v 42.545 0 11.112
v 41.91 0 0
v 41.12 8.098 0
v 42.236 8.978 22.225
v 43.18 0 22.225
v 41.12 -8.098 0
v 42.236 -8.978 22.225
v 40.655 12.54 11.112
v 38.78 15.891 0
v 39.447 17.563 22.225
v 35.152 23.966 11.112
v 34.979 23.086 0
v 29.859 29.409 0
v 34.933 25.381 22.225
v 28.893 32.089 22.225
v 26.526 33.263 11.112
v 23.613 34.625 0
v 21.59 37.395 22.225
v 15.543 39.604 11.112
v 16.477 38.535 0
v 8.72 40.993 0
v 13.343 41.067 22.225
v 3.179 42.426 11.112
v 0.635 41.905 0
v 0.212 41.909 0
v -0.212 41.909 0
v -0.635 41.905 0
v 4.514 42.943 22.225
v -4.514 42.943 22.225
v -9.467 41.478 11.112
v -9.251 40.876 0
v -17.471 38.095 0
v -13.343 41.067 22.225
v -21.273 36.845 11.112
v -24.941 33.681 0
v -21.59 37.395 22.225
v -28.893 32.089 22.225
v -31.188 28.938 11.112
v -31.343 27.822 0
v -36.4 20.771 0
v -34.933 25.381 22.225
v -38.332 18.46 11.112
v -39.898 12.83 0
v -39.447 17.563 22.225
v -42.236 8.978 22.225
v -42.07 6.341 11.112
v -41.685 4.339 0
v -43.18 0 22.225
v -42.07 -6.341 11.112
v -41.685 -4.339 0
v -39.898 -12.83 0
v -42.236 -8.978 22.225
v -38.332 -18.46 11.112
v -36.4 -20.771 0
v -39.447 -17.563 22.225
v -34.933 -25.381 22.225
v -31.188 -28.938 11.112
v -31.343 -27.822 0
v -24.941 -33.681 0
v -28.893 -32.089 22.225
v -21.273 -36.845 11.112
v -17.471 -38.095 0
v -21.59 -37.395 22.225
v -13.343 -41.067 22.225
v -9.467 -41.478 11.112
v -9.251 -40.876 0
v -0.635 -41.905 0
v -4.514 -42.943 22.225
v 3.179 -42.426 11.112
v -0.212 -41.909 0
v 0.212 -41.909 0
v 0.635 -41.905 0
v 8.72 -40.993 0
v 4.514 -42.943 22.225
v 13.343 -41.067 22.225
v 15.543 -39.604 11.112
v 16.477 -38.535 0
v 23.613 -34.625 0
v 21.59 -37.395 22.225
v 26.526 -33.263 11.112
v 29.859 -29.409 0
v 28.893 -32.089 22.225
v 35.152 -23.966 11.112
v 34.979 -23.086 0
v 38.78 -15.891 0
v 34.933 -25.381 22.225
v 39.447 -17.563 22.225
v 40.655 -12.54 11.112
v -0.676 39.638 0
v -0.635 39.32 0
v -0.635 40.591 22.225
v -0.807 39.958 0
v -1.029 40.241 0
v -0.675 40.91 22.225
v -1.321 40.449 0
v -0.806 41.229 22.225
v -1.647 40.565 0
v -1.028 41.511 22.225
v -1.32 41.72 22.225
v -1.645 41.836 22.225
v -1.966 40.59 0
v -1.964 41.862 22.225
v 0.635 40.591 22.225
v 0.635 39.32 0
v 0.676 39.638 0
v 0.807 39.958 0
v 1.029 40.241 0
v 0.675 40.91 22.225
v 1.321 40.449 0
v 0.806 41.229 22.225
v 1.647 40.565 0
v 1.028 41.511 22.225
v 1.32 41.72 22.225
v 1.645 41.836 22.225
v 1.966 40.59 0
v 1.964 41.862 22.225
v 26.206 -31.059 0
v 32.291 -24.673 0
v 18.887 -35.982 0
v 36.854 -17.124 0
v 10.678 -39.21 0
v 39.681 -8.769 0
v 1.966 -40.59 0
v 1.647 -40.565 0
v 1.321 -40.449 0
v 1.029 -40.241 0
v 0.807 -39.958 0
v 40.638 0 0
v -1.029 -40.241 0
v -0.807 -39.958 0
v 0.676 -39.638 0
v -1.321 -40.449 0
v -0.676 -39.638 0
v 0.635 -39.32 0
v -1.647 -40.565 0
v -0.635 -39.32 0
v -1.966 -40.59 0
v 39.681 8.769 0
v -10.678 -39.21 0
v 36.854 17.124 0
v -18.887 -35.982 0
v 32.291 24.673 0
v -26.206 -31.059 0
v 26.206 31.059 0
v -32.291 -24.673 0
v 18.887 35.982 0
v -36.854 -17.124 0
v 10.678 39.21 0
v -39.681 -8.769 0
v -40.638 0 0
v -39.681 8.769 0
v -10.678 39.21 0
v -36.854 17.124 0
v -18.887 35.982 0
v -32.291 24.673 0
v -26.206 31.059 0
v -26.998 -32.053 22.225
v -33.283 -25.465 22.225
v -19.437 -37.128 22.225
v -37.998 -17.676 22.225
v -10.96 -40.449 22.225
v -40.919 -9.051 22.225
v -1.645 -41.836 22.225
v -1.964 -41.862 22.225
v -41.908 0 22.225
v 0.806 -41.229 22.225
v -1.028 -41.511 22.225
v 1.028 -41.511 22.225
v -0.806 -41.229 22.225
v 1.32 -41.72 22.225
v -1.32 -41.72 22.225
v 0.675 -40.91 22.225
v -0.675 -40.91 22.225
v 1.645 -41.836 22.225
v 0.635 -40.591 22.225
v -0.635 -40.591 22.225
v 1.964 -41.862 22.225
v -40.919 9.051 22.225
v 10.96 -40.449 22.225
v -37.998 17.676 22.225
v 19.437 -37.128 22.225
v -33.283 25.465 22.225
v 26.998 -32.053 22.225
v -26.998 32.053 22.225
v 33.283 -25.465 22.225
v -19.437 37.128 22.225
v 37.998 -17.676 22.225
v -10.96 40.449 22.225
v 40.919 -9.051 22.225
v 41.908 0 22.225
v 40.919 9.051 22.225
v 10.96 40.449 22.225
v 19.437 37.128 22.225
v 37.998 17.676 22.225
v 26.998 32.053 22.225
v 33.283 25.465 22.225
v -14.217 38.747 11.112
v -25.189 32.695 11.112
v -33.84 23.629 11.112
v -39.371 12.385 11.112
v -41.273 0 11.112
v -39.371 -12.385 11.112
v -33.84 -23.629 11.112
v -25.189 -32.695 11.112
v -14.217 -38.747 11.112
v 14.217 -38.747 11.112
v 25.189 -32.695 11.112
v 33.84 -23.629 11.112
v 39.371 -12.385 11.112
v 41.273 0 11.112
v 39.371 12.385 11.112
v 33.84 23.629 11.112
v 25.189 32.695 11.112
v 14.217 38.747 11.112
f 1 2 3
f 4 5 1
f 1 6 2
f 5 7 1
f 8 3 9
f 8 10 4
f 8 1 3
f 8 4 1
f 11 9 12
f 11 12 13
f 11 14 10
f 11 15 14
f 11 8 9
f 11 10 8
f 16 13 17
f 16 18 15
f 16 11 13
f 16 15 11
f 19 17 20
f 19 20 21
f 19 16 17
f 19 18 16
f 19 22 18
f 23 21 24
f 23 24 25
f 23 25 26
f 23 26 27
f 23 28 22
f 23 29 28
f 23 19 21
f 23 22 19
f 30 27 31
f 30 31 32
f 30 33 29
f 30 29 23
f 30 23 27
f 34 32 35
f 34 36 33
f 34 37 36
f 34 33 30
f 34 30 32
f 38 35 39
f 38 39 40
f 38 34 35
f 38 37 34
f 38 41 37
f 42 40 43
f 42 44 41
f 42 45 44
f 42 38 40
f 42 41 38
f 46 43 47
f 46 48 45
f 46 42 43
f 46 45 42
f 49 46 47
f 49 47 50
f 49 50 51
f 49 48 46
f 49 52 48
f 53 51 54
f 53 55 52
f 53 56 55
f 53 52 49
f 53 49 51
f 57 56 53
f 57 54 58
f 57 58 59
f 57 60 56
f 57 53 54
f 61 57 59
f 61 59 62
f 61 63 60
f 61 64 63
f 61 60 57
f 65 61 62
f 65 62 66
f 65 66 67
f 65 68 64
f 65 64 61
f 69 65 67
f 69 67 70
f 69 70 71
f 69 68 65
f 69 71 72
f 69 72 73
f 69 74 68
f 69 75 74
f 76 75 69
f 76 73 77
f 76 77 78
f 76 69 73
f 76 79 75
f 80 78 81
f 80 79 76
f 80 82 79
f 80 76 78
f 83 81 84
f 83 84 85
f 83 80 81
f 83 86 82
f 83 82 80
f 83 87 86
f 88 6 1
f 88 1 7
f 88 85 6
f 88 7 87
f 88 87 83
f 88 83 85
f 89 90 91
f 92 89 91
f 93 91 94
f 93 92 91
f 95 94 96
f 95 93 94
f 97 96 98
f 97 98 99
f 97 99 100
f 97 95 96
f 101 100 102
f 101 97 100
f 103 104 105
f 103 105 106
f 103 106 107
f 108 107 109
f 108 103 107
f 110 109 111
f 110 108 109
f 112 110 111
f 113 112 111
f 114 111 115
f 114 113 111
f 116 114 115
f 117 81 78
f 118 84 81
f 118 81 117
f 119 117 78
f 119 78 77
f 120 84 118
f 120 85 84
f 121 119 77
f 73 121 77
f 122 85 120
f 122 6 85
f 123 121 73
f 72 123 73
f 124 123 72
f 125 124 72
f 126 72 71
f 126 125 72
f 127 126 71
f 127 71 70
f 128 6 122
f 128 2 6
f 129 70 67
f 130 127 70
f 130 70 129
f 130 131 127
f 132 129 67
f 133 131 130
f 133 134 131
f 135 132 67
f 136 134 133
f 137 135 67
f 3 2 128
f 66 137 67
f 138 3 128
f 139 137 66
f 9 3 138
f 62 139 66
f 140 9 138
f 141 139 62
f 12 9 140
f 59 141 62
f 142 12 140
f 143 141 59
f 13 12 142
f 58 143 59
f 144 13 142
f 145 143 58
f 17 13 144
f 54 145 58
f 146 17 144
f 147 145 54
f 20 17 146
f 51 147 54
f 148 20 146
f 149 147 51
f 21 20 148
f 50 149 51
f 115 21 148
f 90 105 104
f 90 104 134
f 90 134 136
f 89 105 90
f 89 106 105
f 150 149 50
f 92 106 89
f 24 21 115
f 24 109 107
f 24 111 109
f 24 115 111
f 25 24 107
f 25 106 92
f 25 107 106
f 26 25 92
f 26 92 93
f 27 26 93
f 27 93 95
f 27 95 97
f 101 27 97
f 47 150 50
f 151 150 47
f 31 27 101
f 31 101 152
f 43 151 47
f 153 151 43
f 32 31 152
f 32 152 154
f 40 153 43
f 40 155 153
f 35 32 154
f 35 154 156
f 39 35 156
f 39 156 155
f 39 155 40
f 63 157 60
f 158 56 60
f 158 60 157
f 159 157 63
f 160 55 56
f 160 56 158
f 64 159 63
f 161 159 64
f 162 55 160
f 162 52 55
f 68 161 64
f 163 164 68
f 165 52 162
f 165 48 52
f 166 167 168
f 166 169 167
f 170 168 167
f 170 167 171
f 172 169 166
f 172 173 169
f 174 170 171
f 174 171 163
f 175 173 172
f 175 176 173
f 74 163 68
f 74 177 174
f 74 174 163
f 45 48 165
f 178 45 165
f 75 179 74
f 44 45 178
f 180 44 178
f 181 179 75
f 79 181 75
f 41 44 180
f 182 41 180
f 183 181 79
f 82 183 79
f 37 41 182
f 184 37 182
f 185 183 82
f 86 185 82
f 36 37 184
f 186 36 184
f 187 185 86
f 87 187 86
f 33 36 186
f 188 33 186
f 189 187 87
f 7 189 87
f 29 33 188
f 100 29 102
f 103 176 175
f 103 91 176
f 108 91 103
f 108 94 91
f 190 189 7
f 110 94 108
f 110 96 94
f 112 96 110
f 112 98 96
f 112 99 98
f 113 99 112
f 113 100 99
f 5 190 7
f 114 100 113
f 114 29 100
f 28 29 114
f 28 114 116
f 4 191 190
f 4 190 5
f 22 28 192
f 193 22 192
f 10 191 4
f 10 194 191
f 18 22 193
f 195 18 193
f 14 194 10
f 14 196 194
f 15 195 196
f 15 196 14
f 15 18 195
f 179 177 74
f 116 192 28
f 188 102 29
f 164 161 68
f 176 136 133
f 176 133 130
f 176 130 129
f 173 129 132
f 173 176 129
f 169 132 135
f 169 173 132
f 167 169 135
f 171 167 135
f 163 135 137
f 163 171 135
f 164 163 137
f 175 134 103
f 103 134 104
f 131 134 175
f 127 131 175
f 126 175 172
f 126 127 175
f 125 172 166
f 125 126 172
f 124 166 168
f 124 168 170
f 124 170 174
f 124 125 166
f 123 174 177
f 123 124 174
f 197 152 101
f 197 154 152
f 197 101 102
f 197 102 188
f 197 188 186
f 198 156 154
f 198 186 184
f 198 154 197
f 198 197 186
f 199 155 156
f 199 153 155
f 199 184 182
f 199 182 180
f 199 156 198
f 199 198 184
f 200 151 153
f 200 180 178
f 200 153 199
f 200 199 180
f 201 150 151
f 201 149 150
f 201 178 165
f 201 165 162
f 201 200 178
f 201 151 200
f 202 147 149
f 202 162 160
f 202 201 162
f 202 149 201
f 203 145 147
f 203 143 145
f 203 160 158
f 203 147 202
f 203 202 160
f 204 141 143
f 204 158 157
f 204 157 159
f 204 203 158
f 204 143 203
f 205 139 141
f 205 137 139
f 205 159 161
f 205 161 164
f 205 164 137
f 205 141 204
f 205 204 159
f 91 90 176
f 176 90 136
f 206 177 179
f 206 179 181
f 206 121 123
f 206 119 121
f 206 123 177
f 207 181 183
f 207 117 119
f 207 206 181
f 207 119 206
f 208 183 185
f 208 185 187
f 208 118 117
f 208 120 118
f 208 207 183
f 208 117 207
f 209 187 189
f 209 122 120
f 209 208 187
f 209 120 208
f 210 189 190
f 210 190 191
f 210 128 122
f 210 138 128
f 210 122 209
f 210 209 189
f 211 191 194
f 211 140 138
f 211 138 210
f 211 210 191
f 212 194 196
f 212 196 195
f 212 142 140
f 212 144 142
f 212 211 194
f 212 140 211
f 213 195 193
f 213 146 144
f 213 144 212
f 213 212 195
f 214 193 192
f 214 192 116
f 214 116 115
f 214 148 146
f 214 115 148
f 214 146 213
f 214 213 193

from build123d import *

# Parameters (mm, degrees)
F3_DEPTH = 22.225
F4_R     = 1.27


with BuildPart() as f1:
    # F0 (on Front) → F1 (revolve)
    with BuildSketch(Plane.XZ):
        Polygon((41.9079282205, 22.225), (40.6379282205, 0), (41.91, 0), (43.18, 22.225), align=None)
    revolve(axis=Axis((0, 0, 4.1103595868), (0, 0, 1)))

    # F2 (on Top) → F3 (join, through all)
    with BuildSketch(Plane.XY):
        with BuildLine():
            ThreePointArc((0.635, 41.9051891178), (0, 41.91), (-0.635, 41.9051891178))
            Line((-0.635, 41.9051891178), (-0.635, -41.9051891178))
            ThreePointArc((-0.635, -41.9051891178), (0, -41.91), (0.635, -41.9051891178))
            Line((0.635, -41.9051891178), (0.635, 41.9051891178))
        make_face()
    extrude(amount=F3_DEPTH)

    # F4
    f4_edges = [f1.edges().sort_by_distance(p)[0] for p in [
        (0.635, -41.268043, 11.1125),
        (0.635, 41.268043, 11.1125),
        (-0.635, 41.268043, 11.1125),
        (-0.635, -41.268043, 11.1125),
    ]]
    fillet(f4_edges, radius=F4_R)


solid = f1.part
